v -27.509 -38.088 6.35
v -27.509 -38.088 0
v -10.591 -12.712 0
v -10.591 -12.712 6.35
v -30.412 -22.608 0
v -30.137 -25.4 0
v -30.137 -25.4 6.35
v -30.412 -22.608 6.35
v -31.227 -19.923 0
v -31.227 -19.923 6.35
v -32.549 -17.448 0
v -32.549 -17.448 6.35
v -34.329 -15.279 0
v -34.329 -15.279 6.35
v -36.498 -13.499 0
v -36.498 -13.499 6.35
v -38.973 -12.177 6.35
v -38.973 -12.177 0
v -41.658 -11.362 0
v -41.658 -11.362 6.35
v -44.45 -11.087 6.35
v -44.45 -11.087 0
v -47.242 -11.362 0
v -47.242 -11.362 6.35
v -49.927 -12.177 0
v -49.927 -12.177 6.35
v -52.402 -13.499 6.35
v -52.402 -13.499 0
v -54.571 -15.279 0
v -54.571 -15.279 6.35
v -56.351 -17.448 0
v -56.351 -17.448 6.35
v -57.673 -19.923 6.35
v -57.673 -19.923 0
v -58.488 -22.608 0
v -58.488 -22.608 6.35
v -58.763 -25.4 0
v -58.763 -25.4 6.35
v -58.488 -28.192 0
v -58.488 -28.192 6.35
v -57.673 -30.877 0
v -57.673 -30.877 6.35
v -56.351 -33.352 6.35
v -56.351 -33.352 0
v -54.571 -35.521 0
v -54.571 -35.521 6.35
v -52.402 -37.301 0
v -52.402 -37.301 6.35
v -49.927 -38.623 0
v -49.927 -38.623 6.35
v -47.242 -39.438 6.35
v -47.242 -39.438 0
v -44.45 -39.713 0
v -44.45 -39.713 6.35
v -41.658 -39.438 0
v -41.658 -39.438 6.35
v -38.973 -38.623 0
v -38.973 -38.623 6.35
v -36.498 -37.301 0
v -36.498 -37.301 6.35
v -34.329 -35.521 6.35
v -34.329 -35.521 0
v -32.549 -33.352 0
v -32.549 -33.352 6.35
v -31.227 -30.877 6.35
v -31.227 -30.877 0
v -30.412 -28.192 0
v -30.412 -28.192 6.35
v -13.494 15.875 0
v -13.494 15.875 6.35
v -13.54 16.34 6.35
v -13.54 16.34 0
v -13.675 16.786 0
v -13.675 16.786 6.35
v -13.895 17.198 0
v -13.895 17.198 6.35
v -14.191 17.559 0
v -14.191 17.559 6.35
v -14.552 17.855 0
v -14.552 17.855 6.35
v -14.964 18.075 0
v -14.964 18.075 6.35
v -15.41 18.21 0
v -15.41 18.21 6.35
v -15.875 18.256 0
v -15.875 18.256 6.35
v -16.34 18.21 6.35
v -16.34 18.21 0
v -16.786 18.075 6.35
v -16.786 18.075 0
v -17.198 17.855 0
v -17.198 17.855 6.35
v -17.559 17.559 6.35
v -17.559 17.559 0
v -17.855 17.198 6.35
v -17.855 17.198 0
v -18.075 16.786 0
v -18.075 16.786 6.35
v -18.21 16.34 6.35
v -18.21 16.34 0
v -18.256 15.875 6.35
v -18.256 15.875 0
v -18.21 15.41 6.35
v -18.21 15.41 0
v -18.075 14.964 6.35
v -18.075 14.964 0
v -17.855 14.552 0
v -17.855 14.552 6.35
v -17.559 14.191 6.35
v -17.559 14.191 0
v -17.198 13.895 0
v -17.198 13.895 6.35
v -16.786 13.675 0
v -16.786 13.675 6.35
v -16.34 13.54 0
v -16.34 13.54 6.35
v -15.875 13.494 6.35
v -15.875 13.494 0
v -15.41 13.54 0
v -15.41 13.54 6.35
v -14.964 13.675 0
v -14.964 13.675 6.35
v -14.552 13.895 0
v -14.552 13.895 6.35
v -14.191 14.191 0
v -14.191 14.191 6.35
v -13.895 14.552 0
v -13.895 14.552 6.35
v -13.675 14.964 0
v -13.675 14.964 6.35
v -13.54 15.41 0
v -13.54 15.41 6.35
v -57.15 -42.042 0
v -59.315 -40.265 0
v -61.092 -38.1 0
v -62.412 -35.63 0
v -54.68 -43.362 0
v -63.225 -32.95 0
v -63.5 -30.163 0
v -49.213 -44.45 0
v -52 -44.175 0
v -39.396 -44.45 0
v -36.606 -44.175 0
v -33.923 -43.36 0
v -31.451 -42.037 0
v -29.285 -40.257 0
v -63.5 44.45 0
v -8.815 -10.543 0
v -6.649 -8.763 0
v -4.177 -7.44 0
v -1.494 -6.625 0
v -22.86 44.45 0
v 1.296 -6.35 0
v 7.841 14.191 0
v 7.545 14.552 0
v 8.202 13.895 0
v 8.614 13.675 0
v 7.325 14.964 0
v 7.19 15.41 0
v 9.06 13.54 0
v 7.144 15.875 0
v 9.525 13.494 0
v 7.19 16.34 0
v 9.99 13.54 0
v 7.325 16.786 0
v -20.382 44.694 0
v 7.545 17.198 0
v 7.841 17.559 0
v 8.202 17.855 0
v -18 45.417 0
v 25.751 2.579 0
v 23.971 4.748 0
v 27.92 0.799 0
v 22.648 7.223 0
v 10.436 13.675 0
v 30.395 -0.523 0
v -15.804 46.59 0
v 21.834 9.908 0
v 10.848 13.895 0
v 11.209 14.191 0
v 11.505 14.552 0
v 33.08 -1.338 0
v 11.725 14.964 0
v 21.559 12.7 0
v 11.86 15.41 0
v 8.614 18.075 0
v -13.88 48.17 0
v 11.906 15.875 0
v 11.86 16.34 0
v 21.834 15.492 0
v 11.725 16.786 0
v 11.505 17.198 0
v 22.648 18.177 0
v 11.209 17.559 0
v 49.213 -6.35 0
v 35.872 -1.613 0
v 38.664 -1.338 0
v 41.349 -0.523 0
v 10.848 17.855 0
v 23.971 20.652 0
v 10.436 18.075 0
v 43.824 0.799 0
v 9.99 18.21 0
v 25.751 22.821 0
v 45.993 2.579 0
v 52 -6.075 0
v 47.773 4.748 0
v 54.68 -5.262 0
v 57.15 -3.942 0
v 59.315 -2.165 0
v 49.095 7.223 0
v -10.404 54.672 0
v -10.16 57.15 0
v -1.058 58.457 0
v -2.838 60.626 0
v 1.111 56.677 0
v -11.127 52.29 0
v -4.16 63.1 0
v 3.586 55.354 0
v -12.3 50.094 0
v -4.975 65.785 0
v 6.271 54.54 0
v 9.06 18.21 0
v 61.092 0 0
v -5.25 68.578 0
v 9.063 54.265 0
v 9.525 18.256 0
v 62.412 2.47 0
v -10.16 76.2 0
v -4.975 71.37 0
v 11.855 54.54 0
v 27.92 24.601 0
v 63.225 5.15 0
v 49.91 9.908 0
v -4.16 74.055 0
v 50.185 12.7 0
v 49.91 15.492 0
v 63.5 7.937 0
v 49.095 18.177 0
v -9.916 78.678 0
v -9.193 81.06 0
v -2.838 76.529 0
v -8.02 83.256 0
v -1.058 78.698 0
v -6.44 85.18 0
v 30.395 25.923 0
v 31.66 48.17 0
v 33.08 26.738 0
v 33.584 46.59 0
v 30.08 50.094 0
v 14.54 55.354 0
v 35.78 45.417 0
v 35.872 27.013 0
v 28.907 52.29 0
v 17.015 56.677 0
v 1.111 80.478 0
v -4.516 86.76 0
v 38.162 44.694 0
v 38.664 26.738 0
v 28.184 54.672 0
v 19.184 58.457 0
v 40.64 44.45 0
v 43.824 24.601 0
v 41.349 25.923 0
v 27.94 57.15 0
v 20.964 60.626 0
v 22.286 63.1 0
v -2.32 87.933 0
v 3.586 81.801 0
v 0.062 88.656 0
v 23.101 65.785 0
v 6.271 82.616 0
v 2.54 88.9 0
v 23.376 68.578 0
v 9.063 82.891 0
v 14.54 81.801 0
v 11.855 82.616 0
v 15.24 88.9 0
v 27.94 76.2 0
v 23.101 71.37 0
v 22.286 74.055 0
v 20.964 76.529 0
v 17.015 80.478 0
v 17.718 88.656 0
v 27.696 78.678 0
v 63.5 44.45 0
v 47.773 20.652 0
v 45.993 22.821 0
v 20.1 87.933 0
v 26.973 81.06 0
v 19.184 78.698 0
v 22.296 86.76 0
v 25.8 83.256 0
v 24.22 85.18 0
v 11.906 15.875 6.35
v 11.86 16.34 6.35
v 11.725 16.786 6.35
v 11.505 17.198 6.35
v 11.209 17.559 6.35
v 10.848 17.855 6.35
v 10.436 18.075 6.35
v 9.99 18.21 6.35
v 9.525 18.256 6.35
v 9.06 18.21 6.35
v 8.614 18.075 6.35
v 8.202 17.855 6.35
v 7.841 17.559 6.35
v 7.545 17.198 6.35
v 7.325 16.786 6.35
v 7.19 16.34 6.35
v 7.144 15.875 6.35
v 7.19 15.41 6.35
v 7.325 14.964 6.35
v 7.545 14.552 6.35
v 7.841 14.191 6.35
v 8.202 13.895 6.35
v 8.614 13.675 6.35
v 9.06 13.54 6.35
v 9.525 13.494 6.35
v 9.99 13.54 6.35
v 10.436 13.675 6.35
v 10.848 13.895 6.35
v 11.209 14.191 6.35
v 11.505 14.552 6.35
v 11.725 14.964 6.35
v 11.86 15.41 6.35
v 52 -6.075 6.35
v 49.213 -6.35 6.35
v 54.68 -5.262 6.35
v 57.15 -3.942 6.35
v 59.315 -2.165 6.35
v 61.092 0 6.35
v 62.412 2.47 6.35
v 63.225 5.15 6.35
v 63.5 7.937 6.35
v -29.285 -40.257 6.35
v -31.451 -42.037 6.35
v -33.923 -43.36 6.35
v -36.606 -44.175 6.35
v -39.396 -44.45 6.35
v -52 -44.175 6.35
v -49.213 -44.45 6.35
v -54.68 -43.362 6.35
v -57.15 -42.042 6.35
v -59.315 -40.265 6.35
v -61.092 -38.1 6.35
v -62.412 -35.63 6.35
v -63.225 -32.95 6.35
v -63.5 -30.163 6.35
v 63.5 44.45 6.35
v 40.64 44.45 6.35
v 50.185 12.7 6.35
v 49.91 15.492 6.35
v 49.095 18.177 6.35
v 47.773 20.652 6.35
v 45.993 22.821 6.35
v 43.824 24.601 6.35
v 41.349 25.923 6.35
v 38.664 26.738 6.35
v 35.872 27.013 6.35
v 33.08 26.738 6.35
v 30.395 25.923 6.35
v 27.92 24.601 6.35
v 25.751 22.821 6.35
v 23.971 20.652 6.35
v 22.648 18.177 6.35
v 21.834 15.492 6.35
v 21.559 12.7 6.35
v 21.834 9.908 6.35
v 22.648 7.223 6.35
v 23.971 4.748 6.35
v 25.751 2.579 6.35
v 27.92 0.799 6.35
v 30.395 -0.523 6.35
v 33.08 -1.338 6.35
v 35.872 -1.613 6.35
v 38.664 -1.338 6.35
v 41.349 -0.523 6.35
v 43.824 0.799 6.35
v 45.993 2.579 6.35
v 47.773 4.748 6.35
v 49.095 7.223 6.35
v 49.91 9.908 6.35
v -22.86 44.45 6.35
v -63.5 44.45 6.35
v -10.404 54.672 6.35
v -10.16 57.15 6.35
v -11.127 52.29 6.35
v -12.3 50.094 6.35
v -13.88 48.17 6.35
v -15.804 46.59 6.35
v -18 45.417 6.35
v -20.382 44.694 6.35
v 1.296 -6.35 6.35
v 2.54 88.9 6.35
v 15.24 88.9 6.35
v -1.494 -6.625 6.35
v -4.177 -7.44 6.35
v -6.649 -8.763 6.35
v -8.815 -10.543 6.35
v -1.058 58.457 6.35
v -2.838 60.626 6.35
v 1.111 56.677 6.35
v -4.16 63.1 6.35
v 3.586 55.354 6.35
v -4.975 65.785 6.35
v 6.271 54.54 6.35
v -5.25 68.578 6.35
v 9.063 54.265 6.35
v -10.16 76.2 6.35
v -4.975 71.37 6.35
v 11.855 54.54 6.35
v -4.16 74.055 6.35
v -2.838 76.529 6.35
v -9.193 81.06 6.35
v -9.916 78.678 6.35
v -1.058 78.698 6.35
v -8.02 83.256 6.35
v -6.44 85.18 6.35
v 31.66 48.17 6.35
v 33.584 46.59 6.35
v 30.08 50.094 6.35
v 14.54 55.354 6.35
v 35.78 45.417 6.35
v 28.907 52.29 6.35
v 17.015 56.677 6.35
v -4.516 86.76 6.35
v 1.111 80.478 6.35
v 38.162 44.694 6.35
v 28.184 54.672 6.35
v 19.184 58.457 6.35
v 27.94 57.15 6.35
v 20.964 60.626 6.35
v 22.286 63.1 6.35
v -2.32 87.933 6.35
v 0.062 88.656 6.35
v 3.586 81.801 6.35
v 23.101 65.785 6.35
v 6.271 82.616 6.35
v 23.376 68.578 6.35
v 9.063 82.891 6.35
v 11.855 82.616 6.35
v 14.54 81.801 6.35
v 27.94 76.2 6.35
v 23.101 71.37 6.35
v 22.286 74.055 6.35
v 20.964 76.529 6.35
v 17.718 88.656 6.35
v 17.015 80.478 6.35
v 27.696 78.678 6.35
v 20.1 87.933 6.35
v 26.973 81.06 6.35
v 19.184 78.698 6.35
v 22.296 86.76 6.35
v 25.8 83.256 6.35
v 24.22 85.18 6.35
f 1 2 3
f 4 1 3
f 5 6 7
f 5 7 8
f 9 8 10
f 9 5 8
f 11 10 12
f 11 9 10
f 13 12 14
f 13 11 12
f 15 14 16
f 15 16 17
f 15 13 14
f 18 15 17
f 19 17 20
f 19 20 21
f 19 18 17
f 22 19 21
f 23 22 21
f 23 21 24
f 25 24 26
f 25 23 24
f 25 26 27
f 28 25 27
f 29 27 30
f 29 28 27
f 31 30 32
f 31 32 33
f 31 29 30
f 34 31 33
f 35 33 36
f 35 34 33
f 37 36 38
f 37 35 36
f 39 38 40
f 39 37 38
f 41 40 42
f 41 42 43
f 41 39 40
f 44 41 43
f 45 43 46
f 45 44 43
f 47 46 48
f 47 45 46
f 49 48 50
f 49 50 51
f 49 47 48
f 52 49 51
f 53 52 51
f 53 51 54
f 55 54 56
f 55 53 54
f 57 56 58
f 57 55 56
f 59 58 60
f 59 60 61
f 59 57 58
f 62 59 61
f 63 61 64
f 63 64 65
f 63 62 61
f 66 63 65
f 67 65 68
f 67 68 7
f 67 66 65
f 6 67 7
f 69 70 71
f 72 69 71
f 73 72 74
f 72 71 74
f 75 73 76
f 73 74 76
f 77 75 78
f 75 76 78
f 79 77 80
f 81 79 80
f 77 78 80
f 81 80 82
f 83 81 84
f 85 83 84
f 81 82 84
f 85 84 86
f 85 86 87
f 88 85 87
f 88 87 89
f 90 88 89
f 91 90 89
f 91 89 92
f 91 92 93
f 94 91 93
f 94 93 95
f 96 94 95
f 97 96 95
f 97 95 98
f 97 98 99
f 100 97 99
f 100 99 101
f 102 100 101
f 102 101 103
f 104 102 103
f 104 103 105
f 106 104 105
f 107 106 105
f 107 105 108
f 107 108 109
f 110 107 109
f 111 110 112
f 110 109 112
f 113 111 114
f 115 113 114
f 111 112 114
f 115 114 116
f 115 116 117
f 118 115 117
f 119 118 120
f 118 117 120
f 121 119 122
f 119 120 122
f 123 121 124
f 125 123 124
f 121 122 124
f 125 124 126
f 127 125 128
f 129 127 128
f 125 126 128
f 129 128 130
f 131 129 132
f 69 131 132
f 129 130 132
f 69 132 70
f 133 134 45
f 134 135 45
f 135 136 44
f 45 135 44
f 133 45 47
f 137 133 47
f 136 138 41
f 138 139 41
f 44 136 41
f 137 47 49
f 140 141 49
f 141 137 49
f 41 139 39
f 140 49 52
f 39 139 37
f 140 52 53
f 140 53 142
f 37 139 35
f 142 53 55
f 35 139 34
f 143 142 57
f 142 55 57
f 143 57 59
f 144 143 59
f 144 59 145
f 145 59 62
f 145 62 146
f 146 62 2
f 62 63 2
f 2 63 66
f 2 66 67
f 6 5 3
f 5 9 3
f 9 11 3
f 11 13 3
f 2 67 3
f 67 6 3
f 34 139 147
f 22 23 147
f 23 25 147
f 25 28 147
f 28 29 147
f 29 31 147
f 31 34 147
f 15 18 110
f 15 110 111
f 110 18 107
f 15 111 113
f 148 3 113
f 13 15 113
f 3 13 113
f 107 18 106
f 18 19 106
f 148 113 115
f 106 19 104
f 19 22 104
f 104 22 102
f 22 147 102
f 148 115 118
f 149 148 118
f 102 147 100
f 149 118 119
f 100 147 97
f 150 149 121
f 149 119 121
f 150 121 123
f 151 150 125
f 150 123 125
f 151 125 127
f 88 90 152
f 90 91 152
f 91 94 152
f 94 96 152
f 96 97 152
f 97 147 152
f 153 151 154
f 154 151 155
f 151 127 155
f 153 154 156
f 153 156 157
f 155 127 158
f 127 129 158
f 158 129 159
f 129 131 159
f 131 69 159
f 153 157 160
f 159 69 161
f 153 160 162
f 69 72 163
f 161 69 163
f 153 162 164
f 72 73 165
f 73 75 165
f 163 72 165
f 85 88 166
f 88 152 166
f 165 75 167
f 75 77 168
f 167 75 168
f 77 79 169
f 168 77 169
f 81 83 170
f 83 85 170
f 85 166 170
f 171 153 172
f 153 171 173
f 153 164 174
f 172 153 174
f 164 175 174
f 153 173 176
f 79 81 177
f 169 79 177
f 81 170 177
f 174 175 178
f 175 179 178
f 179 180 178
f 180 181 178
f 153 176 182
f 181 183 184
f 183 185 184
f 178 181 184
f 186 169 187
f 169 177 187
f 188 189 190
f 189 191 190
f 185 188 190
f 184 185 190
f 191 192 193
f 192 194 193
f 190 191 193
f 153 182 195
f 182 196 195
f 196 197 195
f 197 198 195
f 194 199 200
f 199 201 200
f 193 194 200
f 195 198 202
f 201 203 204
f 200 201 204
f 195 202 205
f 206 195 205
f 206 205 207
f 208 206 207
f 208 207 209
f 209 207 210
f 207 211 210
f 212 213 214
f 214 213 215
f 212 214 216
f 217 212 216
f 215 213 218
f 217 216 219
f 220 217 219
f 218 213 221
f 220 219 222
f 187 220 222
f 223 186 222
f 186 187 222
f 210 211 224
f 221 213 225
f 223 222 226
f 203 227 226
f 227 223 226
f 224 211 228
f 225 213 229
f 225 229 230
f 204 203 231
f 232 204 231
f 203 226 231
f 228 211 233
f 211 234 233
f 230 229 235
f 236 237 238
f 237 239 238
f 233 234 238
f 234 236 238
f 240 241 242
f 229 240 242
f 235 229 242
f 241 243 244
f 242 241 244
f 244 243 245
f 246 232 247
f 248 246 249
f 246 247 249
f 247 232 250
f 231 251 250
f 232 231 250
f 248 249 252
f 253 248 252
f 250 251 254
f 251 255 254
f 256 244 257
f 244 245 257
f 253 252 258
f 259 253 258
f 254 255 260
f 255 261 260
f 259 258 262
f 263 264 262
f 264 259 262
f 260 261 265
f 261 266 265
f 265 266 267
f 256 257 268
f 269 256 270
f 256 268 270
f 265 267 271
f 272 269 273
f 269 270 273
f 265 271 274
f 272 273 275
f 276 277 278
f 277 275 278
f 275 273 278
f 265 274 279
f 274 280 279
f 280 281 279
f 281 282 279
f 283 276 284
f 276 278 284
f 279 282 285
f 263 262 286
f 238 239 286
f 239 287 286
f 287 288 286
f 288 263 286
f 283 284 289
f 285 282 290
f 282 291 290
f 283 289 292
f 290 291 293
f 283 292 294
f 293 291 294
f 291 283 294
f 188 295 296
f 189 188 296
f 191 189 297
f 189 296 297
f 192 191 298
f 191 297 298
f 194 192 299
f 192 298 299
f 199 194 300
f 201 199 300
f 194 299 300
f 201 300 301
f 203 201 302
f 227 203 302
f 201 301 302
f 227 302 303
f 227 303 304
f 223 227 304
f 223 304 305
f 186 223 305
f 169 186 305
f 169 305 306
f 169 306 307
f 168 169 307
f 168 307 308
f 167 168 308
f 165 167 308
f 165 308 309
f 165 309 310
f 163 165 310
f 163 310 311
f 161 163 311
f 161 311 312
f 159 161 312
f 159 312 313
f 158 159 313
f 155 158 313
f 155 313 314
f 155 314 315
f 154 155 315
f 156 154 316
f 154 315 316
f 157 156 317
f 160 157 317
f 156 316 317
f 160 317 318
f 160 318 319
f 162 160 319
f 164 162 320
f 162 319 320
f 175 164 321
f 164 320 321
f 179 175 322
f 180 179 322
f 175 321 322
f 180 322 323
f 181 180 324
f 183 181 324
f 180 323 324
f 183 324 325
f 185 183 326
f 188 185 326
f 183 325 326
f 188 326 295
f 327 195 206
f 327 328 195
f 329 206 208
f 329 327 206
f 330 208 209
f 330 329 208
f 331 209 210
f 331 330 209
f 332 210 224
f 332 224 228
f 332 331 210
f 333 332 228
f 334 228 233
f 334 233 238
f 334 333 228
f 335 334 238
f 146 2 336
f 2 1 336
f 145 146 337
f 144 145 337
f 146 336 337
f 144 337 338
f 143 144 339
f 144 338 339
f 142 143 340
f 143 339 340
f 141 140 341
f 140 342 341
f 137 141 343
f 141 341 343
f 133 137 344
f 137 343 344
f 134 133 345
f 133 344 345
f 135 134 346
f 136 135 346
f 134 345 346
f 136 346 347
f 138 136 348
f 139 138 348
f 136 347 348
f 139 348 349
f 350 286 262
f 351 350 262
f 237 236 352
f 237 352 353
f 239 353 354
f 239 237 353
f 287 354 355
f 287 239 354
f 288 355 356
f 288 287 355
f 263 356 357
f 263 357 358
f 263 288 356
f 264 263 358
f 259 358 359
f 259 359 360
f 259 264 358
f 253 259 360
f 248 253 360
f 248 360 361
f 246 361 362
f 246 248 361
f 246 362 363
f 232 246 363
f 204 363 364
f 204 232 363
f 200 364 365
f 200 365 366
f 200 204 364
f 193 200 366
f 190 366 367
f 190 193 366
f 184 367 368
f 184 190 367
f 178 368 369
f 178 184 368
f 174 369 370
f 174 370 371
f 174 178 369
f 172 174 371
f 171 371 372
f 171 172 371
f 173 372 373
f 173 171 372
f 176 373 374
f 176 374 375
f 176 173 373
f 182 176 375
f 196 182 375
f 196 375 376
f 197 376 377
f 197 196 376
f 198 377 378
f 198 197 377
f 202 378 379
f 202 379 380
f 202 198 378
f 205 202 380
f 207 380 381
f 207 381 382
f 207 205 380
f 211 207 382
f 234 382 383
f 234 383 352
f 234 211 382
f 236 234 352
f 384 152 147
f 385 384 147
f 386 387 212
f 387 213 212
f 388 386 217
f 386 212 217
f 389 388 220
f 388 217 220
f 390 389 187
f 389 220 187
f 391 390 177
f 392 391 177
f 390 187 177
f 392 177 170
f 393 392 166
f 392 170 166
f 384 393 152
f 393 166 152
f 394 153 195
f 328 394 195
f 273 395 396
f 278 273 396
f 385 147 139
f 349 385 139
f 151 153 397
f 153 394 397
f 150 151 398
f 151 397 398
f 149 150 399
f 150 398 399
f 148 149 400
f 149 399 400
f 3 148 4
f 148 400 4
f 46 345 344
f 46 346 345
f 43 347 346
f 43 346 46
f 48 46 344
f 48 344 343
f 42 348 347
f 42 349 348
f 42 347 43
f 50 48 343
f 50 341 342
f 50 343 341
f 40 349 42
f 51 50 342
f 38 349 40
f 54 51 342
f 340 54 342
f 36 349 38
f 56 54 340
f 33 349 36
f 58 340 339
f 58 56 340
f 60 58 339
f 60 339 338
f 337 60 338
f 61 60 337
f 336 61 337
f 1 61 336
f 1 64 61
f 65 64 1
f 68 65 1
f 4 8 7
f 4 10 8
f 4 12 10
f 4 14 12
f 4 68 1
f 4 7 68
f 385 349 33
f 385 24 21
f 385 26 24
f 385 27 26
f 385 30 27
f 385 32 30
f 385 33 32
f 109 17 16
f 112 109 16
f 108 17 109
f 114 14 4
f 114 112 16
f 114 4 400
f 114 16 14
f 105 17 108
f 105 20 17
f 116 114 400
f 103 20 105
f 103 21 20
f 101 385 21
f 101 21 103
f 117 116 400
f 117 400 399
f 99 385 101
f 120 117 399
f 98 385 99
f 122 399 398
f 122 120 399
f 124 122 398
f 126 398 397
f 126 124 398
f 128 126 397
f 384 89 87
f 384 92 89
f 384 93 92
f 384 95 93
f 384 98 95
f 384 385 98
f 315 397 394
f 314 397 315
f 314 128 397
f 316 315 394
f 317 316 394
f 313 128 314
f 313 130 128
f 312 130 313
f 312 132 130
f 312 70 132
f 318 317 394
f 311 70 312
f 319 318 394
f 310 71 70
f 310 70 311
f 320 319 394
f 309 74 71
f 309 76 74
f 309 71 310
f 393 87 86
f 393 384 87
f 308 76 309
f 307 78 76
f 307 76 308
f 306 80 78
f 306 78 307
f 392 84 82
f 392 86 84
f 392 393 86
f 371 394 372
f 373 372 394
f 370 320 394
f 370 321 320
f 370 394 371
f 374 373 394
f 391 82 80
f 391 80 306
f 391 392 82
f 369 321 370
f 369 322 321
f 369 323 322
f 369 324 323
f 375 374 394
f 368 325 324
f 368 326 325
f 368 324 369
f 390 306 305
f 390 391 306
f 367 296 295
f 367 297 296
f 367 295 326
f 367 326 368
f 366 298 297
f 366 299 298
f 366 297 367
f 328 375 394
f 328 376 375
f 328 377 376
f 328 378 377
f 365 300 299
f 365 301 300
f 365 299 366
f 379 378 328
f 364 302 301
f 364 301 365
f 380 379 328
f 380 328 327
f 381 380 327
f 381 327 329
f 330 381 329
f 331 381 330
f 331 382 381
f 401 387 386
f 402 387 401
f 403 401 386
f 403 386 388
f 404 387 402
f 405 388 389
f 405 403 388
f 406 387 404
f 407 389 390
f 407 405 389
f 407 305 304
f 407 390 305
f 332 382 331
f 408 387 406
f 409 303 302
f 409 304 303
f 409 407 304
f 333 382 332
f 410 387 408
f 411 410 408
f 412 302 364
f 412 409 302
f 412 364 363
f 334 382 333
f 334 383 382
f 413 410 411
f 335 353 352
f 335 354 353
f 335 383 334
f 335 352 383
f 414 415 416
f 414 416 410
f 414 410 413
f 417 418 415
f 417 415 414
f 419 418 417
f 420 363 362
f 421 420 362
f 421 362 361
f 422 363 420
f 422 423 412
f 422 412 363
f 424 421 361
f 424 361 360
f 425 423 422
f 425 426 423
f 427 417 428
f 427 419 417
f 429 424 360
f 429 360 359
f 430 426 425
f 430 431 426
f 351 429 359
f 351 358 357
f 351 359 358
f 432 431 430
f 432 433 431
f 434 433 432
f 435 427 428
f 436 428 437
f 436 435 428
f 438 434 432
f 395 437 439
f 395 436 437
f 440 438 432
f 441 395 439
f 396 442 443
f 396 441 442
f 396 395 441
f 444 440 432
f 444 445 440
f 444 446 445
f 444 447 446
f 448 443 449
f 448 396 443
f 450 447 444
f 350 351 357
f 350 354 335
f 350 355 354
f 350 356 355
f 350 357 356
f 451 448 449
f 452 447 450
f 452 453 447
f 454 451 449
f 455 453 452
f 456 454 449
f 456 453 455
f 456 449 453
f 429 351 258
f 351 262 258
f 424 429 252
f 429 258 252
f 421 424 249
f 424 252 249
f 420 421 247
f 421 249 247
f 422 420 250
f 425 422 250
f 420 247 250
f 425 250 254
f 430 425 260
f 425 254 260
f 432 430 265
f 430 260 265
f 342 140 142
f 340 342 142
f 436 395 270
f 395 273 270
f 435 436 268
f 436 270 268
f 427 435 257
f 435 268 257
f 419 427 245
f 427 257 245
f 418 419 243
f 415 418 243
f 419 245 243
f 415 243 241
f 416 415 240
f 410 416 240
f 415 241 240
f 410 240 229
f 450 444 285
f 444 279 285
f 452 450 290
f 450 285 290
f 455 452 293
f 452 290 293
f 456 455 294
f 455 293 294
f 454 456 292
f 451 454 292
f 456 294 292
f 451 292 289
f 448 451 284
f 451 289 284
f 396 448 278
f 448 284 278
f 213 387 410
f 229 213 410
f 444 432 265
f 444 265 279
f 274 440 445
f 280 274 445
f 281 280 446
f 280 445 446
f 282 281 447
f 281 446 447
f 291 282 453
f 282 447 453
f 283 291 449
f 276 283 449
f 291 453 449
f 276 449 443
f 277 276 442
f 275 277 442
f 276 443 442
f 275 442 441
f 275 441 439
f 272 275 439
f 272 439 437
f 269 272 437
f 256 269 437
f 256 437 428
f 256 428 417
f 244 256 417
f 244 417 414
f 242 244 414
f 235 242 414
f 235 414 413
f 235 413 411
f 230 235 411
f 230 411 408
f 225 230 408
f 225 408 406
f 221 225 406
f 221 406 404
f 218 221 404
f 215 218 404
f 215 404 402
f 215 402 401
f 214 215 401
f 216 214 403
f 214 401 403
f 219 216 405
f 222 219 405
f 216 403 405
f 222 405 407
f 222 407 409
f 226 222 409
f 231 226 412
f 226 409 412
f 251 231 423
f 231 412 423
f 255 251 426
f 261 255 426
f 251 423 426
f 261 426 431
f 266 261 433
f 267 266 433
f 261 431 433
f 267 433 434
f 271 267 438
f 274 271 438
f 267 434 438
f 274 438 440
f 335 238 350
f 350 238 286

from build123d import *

# Parameters (mm, degrees)
SKETCH1_R           = 14.3129
BOSS_EXTRUDE1_DEPTH = 6.35
FILLET1_R           = 14.2875
SKETCH2_W           = 38.1
SKETCH2_H           = 44.45
BOSS_EXTRUDE2_DEPTH = 6.35
SKETCH3_R           = 14.3129
CUT_EXTRUDE1_DEPTH  = 110.433918417
SKETCH5_R           = 2.38125
CUT_EXTRUDE3_DEPTH  = 110.433918417
FILLET2_R           = 12.7


with BuildPart() as part:
    # Sketch1 → Boss-Extrude1 (new body)
    with BuildSketch(Plane.XY):
        Polygon((-6.35, -6.35), (63.5, -6.35), (63.5, 44.45), (-63.5, 44.45), (-63.5, -44.45), (-31.75, -44.45), align=None)
        with Locations((-44.45, -25.4)):
            Circle(SKETCH1_R, mode=Mode.SUBTRACT)
        with Locations((35.871852568, 12.7)):
            Circle(SKETCH1_R, mode=Mode.SUBTRACT)
    extrude(amount=BOSS_EXTRUDE1_DEPTH)

    # Fillet1
    fillet1_edges = [part.edges().sort_by_distance(p)[0] for p in [
        (-31.75, -44.45, 3.175),
        (-63.5, -44.45, 3.175),
        (63.5, -6.35, 3.175),
        (-6.35, -6.35, 3.175),
    ]]
    fillet(fillet1_edges, radius=FILLET1_R)

    # Sketch2 → Boss-Extrude2 (add)
    with BuildSketch(Plane.XY.offset(6.35)):
        with Locations((8.89, 66.675)):
            Rectangle(SKETCH2_W, SKETCH2_H)
    extrude(amount=-BOSS_EXTRUDE2_DEPTH)

    # Sketch3 → Cut-Extrude1 (cut, through all)
    with BuildSketch(Plane.XY.offset(6.35)):
        with Locations((9.062967637, 68.577618639)):
            Circle(SKETCH3_R)
    extrude(amount=-CUT_EXTRUDE1_DEPTH, mode=Mode.SUBTRACT)

    # Sketch5 → Cut-Extrude3 (cut, through all)
    with BuildSketch(Plane.XY.offset(6.35)):
        with Locations((-15.875, 15.875)):
            Circle(SKETCH5_R)
        with Locations((9.525, 15.875)):
            Circle(SKETCH5_R)
    extrude(amount=-CUT_EXTRUDE3_DEPTH, mode=Mode.SUBTRACT)

    # Fillet2
    fillet2_edges = [part.edges().sort_by_distance(p)[0] for p in [
        (-10.16, 44.45, 3.175),
        (-10.16, 88.9, 3.175),
        (27.94, 88.9, 3.175),
        (27.94, 44.45, 3.175),
    ]]
    fillet(fillet2_edges, radius=FILLET2_R)


solid = part.part
